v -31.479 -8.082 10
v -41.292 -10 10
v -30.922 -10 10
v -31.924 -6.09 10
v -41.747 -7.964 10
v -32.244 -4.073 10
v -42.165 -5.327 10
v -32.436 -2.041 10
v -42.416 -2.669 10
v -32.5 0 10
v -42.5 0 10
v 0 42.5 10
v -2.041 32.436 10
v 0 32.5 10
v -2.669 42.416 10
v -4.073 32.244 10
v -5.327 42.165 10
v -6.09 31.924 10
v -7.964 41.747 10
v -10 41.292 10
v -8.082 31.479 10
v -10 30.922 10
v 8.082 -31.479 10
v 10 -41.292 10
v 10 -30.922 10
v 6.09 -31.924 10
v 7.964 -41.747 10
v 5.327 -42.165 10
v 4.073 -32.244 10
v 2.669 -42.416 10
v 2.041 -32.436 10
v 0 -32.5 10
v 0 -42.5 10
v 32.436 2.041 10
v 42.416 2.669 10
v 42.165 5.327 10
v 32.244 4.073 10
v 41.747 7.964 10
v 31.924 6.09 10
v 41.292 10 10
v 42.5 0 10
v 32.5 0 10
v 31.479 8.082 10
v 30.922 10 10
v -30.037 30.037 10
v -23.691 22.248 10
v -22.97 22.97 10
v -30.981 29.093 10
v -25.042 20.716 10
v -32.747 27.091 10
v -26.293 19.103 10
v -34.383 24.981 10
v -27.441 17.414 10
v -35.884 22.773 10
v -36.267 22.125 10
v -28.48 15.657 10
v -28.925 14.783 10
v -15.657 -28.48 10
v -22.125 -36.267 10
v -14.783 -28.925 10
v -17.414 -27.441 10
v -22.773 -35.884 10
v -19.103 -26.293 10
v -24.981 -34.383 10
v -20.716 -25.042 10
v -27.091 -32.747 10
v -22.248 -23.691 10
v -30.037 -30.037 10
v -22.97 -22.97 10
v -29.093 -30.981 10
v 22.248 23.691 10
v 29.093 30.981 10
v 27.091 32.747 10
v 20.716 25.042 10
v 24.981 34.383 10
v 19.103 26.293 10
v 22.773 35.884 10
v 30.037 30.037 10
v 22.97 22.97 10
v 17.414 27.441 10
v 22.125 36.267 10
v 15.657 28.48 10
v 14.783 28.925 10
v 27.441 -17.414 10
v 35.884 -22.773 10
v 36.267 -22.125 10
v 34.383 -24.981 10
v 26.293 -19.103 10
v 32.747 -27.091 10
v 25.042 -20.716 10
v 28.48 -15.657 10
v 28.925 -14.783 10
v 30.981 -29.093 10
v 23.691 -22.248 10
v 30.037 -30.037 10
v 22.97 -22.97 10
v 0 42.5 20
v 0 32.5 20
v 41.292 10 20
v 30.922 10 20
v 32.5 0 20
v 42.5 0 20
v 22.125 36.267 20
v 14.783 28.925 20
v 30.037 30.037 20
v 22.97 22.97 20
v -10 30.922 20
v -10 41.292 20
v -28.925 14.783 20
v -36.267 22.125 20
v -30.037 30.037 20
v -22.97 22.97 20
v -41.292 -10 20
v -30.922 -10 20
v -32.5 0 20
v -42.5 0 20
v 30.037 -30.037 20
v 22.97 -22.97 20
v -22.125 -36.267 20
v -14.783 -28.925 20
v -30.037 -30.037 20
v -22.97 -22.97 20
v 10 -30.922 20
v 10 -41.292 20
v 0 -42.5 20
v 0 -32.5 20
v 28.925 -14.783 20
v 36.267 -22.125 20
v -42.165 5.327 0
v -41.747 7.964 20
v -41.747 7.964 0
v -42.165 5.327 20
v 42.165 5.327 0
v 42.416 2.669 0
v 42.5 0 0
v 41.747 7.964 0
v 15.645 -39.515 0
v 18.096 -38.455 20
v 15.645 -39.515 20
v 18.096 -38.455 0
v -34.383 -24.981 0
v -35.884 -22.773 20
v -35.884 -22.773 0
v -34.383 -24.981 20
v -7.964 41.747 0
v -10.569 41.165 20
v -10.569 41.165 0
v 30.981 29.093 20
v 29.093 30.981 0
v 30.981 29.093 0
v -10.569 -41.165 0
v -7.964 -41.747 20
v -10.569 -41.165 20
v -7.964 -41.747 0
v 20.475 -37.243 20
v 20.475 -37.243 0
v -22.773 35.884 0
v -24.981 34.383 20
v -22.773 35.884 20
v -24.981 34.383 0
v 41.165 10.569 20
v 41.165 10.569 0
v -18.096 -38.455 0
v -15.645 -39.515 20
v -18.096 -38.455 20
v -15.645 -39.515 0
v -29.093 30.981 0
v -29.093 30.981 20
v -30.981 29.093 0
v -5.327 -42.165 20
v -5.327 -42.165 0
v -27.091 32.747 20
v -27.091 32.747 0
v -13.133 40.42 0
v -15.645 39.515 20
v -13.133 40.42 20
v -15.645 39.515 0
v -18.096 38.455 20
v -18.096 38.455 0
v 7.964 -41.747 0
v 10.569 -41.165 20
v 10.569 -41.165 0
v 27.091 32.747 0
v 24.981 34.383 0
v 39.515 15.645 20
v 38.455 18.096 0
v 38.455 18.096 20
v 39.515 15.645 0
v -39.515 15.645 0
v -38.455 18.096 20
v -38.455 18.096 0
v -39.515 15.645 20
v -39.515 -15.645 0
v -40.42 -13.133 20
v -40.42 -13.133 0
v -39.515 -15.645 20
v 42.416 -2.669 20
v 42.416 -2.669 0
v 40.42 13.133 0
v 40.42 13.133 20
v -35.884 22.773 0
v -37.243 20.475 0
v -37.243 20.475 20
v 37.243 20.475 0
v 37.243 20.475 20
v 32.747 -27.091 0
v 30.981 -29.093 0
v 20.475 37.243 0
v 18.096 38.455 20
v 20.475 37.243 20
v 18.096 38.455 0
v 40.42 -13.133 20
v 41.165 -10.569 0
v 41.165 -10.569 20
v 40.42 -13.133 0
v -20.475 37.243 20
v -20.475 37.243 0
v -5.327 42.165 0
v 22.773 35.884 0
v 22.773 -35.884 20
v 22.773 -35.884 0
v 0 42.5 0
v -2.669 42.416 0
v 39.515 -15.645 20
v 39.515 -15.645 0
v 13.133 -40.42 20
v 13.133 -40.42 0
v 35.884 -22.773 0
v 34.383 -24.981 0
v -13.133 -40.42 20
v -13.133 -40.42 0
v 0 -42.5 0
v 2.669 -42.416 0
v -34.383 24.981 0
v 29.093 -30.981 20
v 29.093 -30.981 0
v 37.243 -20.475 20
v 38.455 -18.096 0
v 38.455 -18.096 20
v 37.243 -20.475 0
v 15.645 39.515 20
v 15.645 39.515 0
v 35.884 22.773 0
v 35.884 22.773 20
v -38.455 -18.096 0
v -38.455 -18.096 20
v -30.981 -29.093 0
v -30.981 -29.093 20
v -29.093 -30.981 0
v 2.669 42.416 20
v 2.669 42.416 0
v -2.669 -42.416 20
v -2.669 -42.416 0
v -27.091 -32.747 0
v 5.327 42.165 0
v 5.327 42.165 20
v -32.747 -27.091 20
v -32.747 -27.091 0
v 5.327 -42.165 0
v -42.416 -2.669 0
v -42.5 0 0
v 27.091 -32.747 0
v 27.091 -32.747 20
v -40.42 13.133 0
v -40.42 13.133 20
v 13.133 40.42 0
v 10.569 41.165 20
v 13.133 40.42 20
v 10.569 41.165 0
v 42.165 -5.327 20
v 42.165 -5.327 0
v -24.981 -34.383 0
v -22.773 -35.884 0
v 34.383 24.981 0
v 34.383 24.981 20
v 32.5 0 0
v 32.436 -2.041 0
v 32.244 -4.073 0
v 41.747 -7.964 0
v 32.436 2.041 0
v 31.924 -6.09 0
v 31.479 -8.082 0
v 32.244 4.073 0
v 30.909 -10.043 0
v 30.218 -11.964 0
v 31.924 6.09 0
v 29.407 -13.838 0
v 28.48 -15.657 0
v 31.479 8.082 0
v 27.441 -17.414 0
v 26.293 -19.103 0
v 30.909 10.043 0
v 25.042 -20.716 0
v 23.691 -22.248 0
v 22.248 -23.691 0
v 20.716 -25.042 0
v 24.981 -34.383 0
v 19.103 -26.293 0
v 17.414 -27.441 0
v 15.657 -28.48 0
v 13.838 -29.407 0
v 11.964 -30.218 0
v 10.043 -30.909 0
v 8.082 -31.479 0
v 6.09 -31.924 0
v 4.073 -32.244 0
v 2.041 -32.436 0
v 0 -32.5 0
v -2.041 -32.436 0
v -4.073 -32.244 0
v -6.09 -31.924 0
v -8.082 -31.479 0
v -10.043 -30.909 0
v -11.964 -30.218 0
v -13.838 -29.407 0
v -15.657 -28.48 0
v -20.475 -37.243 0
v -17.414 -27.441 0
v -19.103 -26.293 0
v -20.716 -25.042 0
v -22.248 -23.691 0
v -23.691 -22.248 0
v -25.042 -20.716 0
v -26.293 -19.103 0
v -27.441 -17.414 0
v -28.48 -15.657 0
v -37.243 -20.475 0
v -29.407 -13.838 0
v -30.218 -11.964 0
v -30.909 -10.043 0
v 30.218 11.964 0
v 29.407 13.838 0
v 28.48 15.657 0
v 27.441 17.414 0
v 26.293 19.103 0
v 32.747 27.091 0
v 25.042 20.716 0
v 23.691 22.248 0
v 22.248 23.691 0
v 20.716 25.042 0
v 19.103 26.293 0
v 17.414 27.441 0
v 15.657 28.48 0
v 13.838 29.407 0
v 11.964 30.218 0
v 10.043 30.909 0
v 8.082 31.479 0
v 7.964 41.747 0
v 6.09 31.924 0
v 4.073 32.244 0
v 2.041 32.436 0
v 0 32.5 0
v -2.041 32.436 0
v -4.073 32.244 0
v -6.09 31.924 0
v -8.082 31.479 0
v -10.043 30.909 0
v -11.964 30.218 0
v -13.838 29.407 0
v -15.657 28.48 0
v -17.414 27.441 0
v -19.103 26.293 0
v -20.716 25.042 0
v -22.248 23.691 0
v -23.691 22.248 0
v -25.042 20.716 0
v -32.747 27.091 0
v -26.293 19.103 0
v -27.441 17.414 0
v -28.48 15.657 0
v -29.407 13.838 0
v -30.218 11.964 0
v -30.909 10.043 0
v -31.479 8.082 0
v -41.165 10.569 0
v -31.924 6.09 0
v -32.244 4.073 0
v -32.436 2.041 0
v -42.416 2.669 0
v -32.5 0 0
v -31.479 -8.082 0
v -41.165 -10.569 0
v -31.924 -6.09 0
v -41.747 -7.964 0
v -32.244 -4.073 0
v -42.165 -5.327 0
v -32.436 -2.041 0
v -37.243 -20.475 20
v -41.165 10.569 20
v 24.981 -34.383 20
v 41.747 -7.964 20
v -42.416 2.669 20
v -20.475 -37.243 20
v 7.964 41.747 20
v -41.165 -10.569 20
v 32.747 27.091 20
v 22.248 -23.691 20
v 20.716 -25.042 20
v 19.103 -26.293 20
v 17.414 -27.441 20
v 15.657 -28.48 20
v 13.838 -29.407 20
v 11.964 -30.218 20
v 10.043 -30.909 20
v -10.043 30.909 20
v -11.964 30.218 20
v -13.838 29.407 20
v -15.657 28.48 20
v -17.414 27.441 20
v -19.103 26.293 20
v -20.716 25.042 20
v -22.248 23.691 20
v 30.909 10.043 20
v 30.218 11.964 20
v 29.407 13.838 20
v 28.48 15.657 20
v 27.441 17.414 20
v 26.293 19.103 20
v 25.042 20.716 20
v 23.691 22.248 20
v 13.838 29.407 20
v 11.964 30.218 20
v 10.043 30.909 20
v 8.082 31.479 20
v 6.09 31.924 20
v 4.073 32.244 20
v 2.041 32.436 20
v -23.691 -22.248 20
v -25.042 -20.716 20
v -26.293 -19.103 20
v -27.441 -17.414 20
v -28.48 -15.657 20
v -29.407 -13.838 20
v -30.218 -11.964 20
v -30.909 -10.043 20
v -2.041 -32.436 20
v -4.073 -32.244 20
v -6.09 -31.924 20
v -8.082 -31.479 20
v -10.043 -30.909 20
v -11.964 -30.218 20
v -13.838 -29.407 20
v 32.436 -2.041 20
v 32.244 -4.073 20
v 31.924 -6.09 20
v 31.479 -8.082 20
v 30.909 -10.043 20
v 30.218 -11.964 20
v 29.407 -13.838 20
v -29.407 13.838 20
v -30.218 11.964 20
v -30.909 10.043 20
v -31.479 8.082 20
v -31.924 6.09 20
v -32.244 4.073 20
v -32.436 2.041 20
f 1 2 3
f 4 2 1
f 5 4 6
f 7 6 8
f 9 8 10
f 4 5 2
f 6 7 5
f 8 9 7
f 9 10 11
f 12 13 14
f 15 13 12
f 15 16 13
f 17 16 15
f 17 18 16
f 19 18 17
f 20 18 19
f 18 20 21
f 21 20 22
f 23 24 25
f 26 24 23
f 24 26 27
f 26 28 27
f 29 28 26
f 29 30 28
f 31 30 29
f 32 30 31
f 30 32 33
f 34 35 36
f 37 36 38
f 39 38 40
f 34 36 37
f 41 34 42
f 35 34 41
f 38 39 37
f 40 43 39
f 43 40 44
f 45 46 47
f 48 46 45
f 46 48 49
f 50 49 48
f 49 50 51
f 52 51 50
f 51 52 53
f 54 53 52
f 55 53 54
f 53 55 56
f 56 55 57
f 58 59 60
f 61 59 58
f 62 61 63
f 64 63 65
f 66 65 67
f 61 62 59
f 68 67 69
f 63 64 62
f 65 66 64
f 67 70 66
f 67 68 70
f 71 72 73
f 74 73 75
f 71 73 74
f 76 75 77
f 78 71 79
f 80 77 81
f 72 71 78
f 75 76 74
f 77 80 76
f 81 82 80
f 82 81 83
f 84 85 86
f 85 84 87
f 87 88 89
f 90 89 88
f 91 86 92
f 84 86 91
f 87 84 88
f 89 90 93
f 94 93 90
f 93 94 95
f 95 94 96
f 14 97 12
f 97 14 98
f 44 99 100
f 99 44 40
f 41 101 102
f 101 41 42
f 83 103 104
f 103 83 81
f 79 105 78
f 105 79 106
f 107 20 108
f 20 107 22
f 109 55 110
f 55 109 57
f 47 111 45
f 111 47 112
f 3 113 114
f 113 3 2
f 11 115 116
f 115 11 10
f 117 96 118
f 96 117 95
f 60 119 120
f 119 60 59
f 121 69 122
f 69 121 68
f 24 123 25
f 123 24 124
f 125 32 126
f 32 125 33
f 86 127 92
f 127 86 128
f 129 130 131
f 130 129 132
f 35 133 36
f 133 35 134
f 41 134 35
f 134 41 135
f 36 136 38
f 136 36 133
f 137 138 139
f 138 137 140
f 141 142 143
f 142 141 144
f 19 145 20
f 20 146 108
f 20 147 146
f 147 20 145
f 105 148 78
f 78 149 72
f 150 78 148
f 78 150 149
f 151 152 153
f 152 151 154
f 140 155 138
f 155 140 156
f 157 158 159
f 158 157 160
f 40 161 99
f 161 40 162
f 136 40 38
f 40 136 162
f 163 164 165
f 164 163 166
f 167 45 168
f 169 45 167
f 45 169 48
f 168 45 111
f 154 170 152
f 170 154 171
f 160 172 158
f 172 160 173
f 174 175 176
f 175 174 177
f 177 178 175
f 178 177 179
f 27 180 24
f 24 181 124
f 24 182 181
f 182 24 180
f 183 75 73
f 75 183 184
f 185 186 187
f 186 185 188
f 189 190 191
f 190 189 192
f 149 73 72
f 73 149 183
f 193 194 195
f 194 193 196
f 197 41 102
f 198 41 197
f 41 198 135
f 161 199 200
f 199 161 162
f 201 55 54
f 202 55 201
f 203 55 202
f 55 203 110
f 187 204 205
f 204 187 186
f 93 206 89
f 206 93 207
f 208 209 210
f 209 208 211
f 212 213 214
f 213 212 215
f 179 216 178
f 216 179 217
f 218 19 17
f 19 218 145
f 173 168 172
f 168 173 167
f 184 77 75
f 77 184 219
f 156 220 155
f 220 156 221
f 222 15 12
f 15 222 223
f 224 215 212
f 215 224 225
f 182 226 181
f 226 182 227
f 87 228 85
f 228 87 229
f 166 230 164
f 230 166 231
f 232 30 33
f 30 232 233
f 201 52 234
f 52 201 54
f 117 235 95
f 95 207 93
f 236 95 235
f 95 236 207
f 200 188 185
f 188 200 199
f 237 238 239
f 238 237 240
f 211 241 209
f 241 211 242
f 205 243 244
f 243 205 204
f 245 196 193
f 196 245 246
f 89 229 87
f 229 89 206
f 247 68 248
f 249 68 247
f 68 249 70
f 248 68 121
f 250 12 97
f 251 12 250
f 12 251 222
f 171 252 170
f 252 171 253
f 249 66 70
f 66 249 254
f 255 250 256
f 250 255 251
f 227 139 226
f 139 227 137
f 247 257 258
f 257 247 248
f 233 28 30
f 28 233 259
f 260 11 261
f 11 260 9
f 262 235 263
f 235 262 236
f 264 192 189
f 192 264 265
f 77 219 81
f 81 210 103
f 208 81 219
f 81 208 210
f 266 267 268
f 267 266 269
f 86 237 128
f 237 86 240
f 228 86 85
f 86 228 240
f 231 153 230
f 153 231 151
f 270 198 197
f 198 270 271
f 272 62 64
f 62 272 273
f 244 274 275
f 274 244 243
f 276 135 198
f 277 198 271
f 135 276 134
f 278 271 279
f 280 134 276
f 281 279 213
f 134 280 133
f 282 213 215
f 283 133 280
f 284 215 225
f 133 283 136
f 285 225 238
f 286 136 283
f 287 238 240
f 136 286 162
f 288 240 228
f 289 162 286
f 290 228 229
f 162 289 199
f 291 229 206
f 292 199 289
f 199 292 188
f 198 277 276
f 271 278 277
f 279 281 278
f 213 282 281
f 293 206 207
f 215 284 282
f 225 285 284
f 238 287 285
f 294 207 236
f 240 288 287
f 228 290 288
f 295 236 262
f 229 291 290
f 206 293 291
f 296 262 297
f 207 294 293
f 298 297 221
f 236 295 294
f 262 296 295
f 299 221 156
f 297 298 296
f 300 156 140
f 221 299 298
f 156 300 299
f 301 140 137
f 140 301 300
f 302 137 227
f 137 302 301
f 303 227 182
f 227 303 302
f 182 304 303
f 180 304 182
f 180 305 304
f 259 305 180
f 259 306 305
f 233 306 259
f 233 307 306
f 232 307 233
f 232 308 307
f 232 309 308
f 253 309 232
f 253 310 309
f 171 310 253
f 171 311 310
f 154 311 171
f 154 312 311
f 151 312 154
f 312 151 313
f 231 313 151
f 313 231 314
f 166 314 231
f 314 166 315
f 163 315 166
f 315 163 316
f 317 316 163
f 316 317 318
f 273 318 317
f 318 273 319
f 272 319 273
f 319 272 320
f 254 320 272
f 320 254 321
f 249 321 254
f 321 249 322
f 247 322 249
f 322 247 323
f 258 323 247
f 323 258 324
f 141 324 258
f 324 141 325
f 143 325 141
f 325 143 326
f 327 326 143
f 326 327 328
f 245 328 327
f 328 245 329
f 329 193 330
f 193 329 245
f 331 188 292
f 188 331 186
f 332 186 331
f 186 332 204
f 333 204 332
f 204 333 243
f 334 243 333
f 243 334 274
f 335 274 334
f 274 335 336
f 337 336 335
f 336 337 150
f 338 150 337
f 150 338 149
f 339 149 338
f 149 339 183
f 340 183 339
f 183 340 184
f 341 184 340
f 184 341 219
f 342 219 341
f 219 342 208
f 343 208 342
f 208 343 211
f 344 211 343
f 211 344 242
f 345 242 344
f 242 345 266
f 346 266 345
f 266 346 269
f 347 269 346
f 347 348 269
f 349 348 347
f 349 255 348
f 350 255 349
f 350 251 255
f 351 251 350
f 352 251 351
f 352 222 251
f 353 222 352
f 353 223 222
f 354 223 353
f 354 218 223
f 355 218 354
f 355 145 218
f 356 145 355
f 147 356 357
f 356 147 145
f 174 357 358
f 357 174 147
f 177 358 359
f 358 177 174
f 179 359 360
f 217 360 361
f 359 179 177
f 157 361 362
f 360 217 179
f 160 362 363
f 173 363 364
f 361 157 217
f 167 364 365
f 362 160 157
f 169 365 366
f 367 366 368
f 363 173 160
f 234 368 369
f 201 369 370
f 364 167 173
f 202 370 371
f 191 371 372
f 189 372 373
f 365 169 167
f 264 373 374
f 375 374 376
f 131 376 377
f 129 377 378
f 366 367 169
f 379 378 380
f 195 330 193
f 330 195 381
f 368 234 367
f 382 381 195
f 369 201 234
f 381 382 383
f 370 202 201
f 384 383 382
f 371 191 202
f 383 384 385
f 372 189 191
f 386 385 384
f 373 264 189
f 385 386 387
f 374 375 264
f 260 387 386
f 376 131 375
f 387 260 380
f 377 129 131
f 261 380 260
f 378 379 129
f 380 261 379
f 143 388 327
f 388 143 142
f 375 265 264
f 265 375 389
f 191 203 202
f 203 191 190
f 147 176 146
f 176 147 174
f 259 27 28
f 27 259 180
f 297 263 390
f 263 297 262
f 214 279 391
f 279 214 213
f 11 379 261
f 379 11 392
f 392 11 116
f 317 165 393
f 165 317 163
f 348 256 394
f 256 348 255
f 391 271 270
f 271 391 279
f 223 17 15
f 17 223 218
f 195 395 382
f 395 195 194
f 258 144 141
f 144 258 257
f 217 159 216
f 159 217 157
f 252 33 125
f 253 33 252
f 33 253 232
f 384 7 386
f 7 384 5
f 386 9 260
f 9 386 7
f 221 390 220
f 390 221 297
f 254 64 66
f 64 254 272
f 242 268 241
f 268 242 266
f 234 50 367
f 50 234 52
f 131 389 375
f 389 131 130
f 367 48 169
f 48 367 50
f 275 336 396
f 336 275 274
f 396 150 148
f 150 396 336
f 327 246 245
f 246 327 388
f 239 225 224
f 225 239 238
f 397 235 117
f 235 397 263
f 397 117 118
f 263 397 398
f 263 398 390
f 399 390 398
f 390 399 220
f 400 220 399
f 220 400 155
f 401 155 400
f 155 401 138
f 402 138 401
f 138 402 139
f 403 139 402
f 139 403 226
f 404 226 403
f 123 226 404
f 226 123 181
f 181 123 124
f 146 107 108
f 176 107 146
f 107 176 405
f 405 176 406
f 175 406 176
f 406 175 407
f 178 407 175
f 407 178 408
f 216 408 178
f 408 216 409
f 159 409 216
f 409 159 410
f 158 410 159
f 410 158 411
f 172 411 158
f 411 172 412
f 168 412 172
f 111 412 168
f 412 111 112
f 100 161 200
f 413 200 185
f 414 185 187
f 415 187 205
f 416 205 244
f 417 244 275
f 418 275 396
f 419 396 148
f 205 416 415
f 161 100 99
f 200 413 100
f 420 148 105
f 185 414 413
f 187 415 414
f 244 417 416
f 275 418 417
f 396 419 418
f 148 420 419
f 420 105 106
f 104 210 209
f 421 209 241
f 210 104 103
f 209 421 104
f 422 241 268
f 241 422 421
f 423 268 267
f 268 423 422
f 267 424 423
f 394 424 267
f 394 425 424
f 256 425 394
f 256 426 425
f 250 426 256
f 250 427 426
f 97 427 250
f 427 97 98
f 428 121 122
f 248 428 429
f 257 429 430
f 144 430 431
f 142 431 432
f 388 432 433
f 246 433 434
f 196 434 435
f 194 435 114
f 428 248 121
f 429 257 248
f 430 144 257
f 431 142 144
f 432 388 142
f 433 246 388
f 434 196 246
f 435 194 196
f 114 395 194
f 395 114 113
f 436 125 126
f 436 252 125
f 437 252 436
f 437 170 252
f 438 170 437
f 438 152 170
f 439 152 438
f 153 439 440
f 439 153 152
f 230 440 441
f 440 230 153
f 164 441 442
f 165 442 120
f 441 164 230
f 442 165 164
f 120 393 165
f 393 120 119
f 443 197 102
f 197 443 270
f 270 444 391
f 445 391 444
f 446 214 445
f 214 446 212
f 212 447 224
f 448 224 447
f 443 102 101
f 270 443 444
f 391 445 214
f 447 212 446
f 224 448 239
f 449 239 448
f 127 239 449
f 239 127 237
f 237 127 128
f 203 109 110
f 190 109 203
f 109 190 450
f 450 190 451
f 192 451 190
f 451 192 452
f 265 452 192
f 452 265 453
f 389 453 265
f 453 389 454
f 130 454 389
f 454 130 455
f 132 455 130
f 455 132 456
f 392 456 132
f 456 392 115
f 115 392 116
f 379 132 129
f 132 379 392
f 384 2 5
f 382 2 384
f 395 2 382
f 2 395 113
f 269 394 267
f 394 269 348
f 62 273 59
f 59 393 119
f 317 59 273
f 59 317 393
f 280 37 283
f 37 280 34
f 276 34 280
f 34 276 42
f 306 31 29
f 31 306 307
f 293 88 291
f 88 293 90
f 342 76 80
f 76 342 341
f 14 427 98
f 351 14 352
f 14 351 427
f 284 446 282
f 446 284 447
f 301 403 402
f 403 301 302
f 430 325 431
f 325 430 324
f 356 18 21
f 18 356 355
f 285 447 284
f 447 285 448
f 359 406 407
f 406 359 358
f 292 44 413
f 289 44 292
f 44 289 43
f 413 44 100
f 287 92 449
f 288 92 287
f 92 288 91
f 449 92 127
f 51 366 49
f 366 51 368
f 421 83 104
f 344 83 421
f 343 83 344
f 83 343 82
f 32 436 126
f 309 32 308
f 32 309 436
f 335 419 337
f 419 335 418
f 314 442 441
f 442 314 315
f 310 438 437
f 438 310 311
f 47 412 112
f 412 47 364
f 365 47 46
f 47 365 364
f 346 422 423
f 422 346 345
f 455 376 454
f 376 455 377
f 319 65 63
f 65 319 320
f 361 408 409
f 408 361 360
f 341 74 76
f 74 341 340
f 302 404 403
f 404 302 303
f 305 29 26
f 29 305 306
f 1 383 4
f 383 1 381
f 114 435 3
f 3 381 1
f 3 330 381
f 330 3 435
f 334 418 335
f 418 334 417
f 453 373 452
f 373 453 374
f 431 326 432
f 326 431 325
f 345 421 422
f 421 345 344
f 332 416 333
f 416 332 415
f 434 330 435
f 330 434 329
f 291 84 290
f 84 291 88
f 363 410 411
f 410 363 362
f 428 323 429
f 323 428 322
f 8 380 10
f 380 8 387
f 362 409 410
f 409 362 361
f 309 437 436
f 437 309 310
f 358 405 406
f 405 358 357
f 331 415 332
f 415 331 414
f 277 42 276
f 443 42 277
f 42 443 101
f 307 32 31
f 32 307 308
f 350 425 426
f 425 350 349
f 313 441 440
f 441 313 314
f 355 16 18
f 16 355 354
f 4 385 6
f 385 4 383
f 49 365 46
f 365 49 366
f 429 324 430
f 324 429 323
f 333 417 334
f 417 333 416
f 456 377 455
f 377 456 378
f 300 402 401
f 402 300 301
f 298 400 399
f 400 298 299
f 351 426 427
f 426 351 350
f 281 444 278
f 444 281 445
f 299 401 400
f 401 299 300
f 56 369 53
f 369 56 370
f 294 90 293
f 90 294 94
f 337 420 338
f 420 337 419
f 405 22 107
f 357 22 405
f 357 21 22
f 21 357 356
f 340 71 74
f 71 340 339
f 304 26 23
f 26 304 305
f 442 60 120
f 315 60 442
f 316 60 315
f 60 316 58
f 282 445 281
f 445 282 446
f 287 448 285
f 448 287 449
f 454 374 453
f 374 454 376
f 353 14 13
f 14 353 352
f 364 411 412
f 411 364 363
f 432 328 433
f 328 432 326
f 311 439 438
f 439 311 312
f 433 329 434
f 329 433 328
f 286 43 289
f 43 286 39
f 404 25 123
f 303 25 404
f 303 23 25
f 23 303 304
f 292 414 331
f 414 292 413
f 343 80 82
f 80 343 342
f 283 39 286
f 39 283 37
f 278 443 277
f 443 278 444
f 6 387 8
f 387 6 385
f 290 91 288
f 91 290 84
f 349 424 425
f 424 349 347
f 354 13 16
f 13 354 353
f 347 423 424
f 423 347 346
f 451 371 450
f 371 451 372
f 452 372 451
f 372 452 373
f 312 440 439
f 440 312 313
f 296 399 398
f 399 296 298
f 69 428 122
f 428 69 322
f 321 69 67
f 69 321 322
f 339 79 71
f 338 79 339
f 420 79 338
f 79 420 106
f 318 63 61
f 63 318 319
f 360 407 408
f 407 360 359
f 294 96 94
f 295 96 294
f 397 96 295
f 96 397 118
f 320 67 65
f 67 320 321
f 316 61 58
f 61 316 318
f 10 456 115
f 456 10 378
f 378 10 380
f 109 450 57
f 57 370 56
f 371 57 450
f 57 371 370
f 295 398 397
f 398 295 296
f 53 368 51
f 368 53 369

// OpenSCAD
//Adapter für hohe Orchideentöpfe
//height adjuster for orchid plant pots
//20180603 P. de Graaff

$fn=100;
Durchmesser=85; //outer diameter of adjuster
Hoehe=20;       //height of adjuster
difference(){
    cylinder(d=Durchmesser,h=Hoehe);
    cylinder(d=Durchmesser-20,h=Hoehe+1);
    translate([0,0,10])for (i =[0:8]){
        rotate([0,0,i*45])cube([50,10,50]);
    }
}
